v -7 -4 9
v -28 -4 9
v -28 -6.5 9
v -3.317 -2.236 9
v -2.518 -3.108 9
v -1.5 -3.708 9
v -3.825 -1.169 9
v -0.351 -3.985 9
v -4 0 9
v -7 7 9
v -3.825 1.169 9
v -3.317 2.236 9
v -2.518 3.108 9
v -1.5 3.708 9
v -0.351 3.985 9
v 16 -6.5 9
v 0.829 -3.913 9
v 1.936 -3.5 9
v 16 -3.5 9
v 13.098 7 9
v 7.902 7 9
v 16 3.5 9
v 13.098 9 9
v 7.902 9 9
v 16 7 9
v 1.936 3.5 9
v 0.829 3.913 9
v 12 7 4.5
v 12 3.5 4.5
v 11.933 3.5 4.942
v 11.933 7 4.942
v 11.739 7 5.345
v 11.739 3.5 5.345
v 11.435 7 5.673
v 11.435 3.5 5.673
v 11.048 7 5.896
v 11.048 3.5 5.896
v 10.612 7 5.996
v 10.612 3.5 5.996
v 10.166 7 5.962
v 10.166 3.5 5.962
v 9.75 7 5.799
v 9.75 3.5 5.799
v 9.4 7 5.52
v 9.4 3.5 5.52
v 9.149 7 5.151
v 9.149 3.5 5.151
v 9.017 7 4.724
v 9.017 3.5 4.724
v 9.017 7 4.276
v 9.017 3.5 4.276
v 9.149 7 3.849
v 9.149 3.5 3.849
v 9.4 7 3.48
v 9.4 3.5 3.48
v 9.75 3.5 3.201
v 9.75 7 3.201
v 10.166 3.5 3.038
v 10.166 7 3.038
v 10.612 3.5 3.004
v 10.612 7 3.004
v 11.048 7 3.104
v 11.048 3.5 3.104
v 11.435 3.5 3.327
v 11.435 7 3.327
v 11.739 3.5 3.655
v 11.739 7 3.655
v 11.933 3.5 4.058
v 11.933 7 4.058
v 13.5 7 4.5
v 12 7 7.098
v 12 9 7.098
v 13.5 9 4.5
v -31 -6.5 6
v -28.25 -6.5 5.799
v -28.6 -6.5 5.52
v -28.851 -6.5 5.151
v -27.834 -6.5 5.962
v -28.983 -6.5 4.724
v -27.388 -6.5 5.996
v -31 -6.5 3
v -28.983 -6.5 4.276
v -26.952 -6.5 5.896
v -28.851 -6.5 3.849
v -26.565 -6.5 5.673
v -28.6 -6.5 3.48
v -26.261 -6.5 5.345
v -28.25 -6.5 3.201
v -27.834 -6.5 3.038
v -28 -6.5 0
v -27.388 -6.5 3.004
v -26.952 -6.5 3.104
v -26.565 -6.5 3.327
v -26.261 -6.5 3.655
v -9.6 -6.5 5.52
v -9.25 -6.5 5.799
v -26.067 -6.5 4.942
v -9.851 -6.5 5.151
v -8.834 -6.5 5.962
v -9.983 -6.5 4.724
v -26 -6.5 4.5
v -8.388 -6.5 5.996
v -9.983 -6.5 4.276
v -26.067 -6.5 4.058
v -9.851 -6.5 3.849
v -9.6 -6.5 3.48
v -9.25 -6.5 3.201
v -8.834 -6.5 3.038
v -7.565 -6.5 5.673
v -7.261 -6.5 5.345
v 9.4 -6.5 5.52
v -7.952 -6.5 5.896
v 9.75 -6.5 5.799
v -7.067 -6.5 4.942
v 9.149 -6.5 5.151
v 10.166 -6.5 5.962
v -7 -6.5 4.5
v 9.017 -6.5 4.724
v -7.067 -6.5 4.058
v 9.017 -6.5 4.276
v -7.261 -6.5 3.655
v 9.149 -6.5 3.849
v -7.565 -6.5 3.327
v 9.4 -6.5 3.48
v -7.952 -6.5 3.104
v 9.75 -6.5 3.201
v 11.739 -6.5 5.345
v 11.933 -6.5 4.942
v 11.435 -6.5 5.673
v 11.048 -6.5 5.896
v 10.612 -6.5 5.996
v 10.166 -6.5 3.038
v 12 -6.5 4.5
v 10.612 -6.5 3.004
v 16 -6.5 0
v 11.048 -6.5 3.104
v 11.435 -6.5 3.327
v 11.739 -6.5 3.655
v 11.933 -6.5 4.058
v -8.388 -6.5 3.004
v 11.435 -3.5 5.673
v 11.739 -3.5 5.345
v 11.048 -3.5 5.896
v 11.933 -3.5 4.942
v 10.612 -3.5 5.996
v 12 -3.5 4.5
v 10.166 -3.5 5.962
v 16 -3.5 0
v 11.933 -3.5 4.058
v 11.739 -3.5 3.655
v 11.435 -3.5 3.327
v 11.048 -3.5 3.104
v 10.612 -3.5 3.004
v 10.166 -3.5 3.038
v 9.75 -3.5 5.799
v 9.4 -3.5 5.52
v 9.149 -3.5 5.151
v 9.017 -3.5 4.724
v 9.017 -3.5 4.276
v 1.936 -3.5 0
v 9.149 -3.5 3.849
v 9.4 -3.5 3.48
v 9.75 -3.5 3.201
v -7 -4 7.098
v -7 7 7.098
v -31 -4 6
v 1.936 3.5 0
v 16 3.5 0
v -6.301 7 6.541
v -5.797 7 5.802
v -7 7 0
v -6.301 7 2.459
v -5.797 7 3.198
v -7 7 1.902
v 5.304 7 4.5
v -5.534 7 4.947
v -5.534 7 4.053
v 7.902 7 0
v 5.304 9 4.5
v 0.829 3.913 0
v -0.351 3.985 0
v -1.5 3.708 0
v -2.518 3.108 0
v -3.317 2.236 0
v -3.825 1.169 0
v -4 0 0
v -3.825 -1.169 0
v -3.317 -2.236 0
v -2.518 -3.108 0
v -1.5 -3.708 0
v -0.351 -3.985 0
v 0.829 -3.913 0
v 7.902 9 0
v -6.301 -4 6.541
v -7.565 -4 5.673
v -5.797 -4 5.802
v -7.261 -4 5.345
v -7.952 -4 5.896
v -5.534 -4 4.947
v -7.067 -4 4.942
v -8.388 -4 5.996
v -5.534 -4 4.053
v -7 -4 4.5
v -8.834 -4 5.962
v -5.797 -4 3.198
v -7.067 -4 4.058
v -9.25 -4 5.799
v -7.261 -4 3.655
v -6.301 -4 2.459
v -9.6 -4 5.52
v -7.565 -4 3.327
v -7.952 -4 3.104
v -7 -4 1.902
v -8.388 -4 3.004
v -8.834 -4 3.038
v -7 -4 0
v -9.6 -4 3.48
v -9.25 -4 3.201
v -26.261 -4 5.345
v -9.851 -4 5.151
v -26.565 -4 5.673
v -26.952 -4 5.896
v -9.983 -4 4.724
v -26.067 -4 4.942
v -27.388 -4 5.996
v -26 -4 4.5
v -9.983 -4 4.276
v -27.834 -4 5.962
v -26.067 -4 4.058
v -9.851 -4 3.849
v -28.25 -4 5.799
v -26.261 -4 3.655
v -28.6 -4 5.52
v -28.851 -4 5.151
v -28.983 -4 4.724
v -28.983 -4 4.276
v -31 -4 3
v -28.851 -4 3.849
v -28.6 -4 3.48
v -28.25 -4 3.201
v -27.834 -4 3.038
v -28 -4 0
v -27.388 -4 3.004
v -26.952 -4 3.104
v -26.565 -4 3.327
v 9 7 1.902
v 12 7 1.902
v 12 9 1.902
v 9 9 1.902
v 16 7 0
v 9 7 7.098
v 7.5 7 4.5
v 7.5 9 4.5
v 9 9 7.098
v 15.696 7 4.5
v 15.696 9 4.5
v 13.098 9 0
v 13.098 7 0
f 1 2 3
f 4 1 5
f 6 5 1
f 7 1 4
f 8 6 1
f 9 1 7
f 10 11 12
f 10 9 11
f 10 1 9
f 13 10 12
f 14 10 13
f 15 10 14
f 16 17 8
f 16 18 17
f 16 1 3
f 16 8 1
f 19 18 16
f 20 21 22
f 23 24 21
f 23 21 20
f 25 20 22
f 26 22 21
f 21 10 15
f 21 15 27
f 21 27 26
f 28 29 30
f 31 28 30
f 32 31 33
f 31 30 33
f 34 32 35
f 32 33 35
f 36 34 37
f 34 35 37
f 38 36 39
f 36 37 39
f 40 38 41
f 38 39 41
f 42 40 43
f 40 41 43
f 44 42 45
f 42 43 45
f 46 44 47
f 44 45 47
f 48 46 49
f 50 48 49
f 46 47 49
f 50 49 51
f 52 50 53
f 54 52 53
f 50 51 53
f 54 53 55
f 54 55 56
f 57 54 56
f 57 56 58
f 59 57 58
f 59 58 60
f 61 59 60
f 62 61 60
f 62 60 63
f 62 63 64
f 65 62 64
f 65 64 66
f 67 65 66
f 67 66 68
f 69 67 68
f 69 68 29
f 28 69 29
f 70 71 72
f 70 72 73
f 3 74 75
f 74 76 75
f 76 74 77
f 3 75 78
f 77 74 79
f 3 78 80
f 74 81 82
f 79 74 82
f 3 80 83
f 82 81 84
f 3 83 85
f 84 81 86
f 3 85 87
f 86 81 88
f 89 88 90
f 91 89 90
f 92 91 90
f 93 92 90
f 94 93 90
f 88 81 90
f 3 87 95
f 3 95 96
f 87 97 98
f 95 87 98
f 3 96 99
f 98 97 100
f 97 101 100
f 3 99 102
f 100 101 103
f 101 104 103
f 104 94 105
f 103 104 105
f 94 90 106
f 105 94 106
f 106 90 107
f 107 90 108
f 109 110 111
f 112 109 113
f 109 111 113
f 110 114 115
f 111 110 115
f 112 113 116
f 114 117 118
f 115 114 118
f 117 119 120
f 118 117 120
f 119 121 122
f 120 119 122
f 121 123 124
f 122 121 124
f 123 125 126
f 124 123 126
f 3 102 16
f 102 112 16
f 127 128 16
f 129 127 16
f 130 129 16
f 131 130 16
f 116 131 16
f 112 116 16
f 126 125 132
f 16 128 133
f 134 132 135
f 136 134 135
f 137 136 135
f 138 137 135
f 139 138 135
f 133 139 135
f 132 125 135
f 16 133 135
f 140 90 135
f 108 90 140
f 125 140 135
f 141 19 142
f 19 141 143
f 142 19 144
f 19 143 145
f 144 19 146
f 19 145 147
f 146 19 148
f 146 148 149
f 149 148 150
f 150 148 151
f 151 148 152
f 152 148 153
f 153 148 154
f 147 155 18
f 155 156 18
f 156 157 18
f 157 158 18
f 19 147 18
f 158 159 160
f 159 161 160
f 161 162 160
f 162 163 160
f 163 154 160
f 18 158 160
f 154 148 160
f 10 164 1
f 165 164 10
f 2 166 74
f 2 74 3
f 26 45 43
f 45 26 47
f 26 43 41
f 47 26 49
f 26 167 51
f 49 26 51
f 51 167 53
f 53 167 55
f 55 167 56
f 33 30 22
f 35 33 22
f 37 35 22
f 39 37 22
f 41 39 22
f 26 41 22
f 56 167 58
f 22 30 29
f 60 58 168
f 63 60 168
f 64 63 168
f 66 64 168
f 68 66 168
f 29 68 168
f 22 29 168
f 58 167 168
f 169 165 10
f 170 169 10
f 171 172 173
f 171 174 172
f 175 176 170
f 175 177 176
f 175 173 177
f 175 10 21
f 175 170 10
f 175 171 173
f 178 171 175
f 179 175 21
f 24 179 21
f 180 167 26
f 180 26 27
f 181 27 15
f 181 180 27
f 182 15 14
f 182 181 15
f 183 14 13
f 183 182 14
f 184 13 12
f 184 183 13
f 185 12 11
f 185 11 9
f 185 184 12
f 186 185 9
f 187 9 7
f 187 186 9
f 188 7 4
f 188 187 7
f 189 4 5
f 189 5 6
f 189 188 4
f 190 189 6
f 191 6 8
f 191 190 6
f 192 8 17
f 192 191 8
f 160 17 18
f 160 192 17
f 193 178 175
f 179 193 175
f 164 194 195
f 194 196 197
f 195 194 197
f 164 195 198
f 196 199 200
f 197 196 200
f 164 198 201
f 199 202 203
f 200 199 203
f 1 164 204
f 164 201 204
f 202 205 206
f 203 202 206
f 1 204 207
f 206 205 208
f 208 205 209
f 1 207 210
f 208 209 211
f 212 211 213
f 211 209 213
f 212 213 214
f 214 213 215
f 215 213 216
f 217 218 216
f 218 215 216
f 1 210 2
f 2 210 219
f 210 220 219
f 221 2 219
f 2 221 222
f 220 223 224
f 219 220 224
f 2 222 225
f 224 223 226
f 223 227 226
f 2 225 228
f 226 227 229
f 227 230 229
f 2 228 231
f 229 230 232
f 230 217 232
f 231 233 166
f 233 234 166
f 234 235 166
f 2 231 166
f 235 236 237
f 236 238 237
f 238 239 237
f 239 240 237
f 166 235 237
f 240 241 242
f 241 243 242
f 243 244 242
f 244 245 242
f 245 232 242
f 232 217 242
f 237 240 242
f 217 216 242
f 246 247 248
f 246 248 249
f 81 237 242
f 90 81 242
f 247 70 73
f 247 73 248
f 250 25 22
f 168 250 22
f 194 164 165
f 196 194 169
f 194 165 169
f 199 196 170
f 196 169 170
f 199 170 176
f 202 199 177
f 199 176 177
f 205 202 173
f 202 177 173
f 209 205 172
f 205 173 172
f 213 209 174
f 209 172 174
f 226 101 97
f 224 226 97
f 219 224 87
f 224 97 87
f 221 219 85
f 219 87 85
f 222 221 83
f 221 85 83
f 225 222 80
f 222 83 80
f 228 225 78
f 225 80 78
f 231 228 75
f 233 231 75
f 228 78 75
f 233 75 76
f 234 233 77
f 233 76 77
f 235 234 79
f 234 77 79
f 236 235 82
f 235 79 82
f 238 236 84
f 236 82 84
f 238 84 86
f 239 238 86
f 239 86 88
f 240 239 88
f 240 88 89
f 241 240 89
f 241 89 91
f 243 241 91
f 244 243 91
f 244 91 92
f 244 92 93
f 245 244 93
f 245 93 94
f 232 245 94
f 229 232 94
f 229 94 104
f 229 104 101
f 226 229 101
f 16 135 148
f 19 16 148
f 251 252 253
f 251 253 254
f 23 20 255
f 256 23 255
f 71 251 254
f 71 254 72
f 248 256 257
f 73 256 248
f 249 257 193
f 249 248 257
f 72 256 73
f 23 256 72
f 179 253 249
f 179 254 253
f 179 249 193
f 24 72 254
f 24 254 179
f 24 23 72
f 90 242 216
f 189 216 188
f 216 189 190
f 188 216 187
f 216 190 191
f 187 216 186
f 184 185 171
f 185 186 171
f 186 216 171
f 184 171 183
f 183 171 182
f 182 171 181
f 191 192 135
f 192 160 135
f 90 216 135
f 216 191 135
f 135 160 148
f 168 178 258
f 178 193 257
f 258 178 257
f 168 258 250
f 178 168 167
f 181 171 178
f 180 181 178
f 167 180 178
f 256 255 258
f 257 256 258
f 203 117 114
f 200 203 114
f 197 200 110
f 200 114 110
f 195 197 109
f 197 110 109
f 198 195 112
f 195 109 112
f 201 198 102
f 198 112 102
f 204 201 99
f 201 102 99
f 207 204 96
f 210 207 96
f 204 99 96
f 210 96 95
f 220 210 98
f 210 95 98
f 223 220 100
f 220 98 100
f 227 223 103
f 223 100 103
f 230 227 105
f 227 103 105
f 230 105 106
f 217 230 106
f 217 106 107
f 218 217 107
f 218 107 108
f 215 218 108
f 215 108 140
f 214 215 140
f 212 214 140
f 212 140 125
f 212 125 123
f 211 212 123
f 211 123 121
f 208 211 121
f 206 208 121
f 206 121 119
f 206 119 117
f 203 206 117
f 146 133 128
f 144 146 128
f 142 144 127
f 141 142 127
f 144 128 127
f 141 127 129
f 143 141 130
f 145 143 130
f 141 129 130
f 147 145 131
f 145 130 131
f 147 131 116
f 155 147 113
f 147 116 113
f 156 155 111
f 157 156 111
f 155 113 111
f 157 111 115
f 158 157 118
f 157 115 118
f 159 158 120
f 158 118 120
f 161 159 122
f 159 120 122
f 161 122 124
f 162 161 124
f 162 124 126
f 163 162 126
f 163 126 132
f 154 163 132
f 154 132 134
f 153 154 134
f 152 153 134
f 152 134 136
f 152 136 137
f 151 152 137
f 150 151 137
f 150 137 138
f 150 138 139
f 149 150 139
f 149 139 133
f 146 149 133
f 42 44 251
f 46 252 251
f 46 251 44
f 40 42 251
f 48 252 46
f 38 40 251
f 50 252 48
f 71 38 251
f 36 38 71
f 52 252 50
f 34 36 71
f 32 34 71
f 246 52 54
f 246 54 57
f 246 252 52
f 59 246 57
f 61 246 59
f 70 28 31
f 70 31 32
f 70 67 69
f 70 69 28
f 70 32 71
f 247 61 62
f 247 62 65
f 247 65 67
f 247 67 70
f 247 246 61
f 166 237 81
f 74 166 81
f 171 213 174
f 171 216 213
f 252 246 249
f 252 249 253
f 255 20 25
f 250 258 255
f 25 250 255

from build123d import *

# Parameters (mm, degrees)
PAD_DEPTH       = 9
SKETCH001_R     = 1.5
POCKET_DEPTH    = 13.501
SKETCH002_R     = 3
POCKET001_DEPTH = 11
PAD001_DEPTH    = 2
POCKET002_DEPTH = 2.501


with BuildPart() as part:
    # Sketch → Pad (new body)
    with BuildSketch(Plane.XY):
        with BuildLine():
            Line((-7, -4), (-31, -4))
            Line((-31, -4), (-31, -6.5))
            Line((-31, -6.5), (16, -6.5))
            Line((16, -6.5), (16, -3.5))
            Line((16, -3.5), (1.936492, -3.5))
            ThreePointArc((1.936492, 3.5), (-4, 0), (1.936492, -3.5))
            Line((1.936492, 3.5), (16, 3.5))
            Line((16, 7), (16, 3.5))
            Line((0, 7), (16, 7))
            Line((-7, 7), (0, 7))
            Line((-7, -4), (-7, 7))
        make_face()
    extrude(amount=PAD_DEPTH)

    # Sketch001 → Pocket (cut, through all)
    with BuildSketch(Plane.XZ.offset(6.5)):
        with Locations((-27.5, 4.5)):
            Circle(SKETCH001_R)
        with Locations((-8.5, 4.5)):
            Circle(SKETCH001_R)
        with Locations((10.5, 4.5)):
            Circle(SKETCH001_R)
    extrude(amount=-POCKET_DEPTH, mode=Mode.SUBTRACT)

    # Sketch002 → Pocket001 (cut)
    with BuildSketch(Plane(origin=(0, 7, 0), x_dir=(-1, 0, 0), z_dir=(0, 1, 0))):
        with Locations((8.5, 4.5)):
            Circle(SKETCH002_R)
    extrude(amount=-POCKET001_DEPTH, mode=Mode.SUBTRACT)

    # Sketch003 → Pad001 (new body)
    with BuildSketch(Plane(origin=(0, 7, 0), x_dir=(-1, 0, 0), z_dir=(0, 1, 0))):
        Polygon((-13.098076, 9), (-15.696152, 4.5), (-13.098076, 0), (-7.901924, 0), (-5.303848, 4.5), (-7.901924, 9), align=None)
        Polygon((-9, 1.901924), (-7.5, 4.5), (-9, 7.098076), (-12, 7.098076), (-13.5, 4.5), (-12, 1.901924), align=None, mode=Mode.SUBTRACT)
    extrude(amount=PAD001_DEPTH)

    # Sketch004 → Pocket002 (cut, through all)
    with BuildSketch(Plane(origin=(0, -4, 0), x_dir=(-1, 0, 0), z_dir=(0, 1, 0))):
        Polygon((31, 6), (28, 9), (31, 9), align=None)
        Polygon((28, 0), (31, 0), (31, 3), align=None)
    extrude(amount=-POCKET002_DEPTH, mode=Mode.SUBTRACT)


solid = part.part
